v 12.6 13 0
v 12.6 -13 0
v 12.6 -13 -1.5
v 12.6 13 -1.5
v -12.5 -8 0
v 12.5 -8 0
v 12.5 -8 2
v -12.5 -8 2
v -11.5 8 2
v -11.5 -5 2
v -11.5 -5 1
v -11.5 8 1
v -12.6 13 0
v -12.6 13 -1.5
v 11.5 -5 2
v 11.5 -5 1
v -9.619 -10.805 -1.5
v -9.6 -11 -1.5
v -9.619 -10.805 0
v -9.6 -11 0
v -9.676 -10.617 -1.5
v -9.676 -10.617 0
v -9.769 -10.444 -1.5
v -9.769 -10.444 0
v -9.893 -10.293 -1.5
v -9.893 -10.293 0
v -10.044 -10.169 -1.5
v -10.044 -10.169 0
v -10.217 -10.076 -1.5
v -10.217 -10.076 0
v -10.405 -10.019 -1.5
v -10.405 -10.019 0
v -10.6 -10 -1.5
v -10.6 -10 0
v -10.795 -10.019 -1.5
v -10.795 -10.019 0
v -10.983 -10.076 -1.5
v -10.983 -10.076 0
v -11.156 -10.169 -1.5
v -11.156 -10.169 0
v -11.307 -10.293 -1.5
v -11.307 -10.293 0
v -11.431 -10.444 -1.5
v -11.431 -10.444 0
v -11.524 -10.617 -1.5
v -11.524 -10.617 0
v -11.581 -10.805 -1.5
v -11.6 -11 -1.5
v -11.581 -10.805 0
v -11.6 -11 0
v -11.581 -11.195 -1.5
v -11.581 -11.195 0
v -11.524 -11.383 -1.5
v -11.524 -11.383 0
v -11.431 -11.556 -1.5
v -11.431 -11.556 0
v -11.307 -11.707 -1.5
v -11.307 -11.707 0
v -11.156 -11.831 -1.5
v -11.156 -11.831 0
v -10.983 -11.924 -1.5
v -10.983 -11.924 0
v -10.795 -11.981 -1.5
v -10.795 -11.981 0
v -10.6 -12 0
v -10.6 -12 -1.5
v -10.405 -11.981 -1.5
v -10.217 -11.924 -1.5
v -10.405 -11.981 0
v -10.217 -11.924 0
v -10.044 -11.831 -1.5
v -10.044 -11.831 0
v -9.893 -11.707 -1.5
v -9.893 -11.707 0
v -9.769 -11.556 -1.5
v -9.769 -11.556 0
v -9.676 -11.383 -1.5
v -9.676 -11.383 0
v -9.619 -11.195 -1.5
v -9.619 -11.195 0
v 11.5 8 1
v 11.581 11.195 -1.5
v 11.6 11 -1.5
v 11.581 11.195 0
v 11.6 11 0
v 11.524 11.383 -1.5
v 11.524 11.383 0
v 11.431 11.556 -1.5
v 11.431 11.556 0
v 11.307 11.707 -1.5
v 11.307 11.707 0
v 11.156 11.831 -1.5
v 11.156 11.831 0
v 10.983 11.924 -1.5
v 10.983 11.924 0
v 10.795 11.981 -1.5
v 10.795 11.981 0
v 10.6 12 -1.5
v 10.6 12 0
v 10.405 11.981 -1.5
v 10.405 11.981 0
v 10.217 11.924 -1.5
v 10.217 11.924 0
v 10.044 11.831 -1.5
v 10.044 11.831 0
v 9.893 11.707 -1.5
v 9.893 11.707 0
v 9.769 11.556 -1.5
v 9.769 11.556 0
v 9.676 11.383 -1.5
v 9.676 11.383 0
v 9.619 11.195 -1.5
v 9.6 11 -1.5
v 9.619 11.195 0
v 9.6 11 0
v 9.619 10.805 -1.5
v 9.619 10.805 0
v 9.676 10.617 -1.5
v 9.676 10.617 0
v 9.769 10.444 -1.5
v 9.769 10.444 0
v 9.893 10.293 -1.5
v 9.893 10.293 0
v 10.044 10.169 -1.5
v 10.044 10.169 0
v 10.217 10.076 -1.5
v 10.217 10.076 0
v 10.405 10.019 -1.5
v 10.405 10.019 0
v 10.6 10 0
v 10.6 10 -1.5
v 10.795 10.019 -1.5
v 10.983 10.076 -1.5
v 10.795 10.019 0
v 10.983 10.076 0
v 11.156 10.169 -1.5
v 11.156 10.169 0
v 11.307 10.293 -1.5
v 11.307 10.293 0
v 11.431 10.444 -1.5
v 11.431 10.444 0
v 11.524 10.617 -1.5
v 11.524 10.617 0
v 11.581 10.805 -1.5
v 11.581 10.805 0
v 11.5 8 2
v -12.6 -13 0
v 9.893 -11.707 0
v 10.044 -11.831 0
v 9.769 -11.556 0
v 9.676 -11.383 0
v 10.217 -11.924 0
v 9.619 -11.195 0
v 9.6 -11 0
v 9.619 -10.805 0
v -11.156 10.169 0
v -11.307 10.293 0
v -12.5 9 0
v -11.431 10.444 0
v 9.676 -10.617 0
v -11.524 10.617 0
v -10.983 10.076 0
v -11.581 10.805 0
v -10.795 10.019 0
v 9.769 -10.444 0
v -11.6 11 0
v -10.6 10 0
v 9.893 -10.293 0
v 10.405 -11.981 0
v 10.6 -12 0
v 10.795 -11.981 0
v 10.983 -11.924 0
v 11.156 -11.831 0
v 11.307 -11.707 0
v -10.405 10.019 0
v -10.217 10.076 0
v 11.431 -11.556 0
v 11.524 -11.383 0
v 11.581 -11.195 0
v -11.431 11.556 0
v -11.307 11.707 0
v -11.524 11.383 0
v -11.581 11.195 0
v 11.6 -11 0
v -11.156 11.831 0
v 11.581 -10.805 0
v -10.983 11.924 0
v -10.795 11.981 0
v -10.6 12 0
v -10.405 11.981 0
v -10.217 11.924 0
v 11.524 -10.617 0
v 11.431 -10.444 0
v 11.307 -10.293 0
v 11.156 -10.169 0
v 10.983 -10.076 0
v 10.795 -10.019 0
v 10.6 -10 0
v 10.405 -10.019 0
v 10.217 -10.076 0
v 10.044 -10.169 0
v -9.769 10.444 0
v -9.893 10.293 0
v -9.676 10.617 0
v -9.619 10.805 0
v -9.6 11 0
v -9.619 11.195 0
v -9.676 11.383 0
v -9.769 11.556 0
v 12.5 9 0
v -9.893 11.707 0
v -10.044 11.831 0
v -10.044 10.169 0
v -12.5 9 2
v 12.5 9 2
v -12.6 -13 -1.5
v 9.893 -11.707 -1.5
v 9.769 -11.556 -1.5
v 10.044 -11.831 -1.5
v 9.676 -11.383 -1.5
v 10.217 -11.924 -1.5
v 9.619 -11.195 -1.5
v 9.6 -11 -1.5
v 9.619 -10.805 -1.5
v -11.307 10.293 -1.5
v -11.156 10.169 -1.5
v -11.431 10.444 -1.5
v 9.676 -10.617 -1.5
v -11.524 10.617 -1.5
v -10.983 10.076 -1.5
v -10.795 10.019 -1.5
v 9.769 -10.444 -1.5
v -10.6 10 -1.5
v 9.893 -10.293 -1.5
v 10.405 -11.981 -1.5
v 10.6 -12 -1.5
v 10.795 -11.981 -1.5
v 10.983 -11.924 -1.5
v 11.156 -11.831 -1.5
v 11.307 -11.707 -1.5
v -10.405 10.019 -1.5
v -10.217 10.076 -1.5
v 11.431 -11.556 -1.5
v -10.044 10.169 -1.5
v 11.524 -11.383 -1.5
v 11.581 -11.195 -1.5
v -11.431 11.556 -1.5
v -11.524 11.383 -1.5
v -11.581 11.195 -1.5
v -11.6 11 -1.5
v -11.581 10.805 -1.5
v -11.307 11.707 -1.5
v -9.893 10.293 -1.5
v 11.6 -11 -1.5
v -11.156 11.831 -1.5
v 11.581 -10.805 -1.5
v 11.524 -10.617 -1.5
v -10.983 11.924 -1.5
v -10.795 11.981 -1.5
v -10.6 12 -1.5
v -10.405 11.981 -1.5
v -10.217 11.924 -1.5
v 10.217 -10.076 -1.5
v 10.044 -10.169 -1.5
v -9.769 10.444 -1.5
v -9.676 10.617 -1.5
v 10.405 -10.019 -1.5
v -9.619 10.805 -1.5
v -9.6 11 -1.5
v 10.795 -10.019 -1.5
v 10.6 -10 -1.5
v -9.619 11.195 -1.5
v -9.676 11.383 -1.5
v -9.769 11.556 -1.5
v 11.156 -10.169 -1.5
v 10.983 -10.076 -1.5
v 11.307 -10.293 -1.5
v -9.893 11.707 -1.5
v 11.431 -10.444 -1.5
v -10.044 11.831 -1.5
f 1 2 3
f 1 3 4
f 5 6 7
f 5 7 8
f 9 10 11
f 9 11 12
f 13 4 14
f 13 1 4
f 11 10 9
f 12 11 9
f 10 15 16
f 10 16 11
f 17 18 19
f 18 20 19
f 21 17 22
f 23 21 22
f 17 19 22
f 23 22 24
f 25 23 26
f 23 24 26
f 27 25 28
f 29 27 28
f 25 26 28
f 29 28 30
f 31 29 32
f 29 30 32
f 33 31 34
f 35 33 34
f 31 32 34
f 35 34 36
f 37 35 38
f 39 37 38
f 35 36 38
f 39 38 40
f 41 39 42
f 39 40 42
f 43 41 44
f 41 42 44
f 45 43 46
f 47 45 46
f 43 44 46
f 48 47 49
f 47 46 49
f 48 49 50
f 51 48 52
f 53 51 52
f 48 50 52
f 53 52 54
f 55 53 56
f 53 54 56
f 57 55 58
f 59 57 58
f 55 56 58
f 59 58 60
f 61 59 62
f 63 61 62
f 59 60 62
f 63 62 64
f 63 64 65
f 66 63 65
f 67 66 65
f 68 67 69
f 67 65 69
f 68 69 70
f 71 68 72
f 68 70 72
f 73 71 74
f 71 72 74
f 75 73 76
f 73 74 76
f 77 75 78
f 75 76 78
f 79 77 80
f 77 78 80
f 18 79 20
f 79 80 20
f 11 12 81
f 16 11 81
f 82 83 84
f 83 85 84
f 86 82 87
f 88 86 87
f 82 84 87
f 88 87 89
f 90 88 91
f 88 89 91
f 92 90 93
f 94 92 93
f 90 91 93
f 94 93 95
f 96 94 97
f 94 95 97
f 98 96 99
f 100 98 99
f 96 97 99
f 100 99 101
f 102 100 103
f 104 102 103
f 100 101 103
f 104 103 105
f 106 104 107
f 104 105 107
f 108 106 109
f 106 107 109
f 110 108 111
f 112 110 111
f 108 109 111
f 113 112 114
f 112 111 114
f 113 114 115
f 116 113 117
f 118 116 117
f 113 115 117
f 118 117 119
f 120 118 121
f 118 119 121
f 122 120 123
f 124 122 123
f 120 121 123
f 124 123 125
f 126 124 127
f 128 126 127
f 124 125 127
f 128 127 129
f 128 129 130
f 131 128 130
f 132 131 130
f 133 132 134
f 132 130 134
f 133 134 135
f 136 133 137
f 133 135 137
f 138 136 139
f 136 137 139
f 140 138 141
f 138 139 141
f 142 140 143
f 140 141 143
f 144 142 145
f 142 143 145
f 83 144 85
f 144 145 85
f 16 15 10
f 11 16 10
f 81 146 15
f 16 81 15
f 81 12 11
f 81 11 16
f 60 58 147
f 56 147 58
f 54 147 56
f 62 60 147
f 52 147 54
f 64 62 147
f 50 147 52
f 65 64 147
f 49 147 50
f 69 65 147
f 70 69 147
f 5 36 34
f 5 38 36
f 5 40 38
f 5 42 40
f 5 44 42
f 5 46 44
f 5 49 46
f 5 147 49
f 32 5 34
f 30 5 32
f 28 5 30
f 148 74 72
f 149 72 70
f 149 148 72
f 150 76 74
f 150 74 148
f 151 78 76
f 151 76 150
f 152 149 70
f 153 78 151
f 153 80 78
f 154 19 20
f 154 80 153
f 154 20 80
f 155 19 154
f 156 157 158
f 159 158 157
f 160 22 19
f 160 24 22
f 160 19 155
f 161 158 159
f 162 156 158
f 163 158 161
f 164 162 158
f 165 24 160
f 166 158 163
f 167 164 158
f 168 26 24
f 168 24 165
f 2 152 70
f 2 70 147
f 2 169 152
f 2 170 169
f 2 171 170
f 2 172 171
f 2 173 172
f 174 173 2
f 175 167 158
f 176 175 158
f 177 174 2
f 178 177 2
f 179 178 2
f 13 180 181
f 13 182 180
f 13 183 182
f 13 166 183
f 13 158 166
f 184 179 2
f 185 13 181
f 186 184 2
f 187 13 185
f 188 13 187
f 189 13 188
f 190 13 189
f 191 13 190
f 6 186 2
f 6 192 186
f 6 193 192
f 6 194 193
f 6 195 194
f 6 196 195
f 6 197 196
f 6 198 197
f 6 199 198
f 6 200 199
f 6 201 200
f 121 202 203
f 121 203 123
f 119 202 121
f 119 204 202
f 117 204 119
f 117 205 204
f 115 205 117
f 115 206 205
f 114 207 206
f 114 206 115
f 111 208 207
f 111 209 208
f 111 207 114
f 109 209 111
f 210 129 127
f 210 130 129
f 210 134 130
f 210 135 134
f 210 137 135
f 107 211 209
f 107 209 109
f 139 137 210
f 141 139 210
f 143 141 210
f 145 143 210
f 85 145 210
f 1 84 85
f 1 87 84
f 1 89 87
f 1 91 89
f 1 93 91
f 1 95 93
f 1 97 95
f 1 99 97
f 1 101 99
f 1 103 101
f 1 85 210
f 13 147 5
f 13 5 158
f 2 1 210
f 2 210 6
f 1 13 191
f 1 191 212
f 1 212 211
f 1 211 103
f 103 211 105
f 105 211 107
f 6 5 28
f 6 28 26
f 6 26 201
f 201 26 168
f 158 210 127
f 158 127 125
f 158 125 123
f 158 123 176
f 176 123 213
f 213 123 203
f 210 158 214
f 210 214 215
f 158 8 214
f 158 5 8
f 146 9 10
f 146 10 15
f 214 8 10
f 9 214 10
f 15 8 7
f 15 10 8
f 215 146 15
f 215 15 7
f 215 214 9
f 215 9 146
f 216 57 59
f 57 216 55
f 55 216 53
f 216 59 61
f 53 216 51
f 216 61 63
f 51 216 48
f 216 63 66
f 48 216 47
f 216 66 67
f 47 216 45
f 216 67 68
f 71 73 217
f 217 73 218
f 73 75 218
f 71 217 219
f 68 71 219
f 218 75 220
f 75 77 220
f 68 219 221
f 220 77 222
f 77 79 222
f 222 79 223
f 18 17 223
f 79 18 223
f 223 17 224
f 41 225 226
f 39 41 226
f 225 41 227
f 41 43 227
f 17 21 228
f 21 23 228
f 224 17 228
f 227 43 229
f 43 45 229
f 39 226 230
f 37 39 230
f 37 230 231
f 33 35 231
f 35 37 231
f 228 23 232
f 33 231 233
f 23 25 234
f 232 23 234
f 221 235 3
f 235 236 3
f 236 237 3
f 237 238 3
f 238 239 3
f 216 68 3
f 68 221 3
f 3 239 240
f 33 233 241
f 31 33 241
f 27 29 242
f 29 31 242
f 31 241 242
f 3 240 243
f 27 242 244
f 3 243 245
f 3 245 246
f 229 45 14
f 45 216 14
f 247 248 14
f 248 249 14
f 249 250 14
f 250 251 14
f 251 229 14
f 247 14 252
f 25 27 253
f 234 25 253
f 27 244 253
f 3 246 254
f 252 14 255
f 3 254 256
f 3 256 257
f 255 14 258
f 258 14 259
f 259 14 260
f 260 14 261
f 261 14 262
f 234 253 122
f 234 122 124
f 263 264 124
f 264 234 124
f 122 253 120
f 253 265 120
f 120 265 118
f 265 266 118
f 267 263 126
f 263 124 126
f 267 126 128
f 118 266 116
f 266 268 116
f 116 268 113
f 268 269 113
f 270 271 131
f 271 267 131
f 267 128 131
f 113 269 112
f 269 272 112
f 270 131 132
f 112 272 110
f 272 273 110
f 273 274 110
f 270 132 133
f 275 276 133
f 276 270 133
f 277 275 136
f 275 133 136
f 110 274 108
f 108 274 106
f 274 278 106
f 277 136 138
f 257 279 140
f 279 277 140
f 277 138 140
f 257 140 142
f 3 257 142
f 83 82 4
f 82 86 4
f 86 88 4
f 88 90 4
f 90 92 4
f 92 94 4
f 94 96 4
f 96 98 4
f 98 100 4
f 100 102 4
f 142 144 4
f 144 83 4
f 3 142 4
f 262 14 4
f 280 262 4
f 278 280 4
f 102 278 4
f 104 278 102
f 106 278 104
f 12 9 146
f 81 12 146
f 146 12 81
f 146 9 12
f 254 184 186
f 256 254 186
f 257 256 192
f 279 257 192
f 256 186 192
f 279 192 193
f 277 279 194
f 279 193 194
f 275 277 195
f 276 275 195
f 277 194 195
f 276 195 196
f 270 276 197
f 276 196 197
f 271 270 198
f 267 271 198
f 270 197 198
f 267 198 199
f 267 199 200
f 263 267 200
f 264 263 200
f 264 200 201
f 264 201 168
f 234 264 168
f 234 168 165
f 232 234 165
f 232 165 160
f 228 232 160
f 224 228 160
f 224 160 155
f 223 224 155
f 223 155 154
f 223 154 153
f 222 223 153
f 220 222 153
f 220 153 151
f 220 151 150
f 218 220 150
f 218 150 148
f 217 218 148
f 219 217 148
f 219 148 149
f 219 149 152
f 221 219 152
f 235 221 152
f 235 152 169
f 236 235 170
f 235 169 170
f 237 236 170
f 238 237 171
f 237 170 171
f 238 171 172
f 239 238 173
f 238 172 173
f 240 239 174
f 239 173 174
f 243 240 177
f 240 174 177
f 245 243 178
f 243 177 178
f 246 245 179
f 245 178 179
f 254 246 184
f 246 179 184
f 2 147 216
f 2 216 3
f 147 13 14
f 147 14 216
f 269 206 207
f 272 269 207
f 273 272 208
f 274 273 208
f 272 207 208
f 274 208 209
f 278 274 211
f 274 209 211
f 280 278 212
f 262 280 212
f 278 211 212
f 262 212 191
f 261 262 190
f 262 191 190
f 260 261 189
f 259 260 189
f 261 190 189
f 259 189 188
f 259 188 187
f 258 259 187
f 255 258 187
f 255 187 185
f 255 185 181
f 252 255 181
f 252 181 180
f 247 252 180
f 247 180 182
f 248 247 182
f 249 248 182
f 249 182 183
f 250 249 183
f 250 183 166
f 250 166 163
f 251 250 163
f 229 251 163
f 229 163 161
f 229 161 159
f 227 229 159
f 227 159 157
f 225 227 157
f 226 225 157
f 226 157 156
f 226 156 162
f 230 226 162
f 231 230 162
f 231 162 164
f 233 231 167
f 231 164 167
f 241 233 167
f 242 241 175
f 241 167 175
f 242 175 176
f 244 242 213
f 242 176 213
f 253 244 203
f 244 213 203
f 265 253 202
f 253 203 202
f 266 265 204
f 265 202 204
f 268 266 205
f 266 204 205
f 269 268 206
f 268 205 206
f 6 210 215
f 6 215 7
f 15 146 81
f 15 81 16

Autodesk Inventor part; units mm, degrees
ref_plane "YZ Plane" through (0, 0, 0) normal (1, 0, 0) x (0, 1, 0)
ref_plane "XZ Plane" through (0, 0, 0) normal (0, 1, 0) x (-1, 0, 0)
ref_plane "XY Plane" through (0, 0, 0) normal (0, 0, 1) x (1, 0, 0)
sketch "Эскиз1" plane through (0, 0, 0) normal (0, 0, 1) x (1, 0, 0)
  line L0 (-12.6, -13) -> (12.6, -13)
  line L1 (12.6, -13) -> (12.6, 13)
  line L2 (12.6, 13) -> (-12.6, 13)
  line L3 (-12.6, 13) -> (-12.6, -13)
  line L4 (-12.6, -13) -> (12.6, 13) construction
  line L5 (12.6, -13) -> (-12.6, 13) construction
  circle A0 centre (-10.6, 11) radius 1
  circle A1 centre (10.6, 11) radius 1
  circle A2 centre (10.6, -11) radius 1
  circle A3 centre (-10.6, -11) radius 1
  line L6 (12.5, -8) -> (-12.5, -8)
  line L7 (-12.5, -8) -> (-12.5, 9)
  line L8 (-12.5, 9) -> (12.5, 9)
  line L9 (12.5, 9) -> (12.5, -8)
  point P0 (0, 0)
  point P1 (0, -8)
  point P2 (0, 0)
  dimension "d0" = 25.2
  dimension "d1" = 26
  dimension "d4" = 2
  dimension "d13" = 2
  dimension "d14" = 2
  dimension "d15" = 2
  dimension "d16" = 2
  dimension "d17" = 2
  dimension "d18" = 2
  dimension "d19" = 2
  dimension "d20" = 2
  dimension "d25" = 25
  dimension "d26" = 17
  dimension "d29" = 5
extrude "Выдавливание1" add sketch "Эскиз1" against normal blind 1.5 contours L3 L2 L1 L0 | L6 L7 L8 L9
extrude "Выдавливание2" add sketch "Эскиз1" along normal blind 2 contours L6 L7 L8 L9
sketch "Эскиз2" plane through (0, 0, 2) normal (0, 0, 1) x (1, 0, 0)
  line L0 (-11.5, 8) -> (11.5, 8)
  line L1 (11.5, 8) -> (11.5, -5)
  line L2 (11.5, -5) -> (-11.5, -5)
  line L3 (-11.5, -5) -> (-11.5, 8)
  line L4 (12.5, 9) -> (-12.5, 9) projected
  line L5 (-12.5, -8) -> (12.5, -8) projected
  point P0 (0, 0)
  point P1 (0, 8)
  point P2 (0, 9)
  point P3 (11.5, 1.5)
  point P4 (0, 9)
  dimension "d30" = 13
  dimension "d31" = 23
  dimension "d36" = 3
extrude "Выдавливание3" cut sketch "Эскиз2" against normal blind 1
extrude "Выдавливание4" add sketch "Эскиз2" against normal blind 1 separate body
properties part number "Дисплей"
